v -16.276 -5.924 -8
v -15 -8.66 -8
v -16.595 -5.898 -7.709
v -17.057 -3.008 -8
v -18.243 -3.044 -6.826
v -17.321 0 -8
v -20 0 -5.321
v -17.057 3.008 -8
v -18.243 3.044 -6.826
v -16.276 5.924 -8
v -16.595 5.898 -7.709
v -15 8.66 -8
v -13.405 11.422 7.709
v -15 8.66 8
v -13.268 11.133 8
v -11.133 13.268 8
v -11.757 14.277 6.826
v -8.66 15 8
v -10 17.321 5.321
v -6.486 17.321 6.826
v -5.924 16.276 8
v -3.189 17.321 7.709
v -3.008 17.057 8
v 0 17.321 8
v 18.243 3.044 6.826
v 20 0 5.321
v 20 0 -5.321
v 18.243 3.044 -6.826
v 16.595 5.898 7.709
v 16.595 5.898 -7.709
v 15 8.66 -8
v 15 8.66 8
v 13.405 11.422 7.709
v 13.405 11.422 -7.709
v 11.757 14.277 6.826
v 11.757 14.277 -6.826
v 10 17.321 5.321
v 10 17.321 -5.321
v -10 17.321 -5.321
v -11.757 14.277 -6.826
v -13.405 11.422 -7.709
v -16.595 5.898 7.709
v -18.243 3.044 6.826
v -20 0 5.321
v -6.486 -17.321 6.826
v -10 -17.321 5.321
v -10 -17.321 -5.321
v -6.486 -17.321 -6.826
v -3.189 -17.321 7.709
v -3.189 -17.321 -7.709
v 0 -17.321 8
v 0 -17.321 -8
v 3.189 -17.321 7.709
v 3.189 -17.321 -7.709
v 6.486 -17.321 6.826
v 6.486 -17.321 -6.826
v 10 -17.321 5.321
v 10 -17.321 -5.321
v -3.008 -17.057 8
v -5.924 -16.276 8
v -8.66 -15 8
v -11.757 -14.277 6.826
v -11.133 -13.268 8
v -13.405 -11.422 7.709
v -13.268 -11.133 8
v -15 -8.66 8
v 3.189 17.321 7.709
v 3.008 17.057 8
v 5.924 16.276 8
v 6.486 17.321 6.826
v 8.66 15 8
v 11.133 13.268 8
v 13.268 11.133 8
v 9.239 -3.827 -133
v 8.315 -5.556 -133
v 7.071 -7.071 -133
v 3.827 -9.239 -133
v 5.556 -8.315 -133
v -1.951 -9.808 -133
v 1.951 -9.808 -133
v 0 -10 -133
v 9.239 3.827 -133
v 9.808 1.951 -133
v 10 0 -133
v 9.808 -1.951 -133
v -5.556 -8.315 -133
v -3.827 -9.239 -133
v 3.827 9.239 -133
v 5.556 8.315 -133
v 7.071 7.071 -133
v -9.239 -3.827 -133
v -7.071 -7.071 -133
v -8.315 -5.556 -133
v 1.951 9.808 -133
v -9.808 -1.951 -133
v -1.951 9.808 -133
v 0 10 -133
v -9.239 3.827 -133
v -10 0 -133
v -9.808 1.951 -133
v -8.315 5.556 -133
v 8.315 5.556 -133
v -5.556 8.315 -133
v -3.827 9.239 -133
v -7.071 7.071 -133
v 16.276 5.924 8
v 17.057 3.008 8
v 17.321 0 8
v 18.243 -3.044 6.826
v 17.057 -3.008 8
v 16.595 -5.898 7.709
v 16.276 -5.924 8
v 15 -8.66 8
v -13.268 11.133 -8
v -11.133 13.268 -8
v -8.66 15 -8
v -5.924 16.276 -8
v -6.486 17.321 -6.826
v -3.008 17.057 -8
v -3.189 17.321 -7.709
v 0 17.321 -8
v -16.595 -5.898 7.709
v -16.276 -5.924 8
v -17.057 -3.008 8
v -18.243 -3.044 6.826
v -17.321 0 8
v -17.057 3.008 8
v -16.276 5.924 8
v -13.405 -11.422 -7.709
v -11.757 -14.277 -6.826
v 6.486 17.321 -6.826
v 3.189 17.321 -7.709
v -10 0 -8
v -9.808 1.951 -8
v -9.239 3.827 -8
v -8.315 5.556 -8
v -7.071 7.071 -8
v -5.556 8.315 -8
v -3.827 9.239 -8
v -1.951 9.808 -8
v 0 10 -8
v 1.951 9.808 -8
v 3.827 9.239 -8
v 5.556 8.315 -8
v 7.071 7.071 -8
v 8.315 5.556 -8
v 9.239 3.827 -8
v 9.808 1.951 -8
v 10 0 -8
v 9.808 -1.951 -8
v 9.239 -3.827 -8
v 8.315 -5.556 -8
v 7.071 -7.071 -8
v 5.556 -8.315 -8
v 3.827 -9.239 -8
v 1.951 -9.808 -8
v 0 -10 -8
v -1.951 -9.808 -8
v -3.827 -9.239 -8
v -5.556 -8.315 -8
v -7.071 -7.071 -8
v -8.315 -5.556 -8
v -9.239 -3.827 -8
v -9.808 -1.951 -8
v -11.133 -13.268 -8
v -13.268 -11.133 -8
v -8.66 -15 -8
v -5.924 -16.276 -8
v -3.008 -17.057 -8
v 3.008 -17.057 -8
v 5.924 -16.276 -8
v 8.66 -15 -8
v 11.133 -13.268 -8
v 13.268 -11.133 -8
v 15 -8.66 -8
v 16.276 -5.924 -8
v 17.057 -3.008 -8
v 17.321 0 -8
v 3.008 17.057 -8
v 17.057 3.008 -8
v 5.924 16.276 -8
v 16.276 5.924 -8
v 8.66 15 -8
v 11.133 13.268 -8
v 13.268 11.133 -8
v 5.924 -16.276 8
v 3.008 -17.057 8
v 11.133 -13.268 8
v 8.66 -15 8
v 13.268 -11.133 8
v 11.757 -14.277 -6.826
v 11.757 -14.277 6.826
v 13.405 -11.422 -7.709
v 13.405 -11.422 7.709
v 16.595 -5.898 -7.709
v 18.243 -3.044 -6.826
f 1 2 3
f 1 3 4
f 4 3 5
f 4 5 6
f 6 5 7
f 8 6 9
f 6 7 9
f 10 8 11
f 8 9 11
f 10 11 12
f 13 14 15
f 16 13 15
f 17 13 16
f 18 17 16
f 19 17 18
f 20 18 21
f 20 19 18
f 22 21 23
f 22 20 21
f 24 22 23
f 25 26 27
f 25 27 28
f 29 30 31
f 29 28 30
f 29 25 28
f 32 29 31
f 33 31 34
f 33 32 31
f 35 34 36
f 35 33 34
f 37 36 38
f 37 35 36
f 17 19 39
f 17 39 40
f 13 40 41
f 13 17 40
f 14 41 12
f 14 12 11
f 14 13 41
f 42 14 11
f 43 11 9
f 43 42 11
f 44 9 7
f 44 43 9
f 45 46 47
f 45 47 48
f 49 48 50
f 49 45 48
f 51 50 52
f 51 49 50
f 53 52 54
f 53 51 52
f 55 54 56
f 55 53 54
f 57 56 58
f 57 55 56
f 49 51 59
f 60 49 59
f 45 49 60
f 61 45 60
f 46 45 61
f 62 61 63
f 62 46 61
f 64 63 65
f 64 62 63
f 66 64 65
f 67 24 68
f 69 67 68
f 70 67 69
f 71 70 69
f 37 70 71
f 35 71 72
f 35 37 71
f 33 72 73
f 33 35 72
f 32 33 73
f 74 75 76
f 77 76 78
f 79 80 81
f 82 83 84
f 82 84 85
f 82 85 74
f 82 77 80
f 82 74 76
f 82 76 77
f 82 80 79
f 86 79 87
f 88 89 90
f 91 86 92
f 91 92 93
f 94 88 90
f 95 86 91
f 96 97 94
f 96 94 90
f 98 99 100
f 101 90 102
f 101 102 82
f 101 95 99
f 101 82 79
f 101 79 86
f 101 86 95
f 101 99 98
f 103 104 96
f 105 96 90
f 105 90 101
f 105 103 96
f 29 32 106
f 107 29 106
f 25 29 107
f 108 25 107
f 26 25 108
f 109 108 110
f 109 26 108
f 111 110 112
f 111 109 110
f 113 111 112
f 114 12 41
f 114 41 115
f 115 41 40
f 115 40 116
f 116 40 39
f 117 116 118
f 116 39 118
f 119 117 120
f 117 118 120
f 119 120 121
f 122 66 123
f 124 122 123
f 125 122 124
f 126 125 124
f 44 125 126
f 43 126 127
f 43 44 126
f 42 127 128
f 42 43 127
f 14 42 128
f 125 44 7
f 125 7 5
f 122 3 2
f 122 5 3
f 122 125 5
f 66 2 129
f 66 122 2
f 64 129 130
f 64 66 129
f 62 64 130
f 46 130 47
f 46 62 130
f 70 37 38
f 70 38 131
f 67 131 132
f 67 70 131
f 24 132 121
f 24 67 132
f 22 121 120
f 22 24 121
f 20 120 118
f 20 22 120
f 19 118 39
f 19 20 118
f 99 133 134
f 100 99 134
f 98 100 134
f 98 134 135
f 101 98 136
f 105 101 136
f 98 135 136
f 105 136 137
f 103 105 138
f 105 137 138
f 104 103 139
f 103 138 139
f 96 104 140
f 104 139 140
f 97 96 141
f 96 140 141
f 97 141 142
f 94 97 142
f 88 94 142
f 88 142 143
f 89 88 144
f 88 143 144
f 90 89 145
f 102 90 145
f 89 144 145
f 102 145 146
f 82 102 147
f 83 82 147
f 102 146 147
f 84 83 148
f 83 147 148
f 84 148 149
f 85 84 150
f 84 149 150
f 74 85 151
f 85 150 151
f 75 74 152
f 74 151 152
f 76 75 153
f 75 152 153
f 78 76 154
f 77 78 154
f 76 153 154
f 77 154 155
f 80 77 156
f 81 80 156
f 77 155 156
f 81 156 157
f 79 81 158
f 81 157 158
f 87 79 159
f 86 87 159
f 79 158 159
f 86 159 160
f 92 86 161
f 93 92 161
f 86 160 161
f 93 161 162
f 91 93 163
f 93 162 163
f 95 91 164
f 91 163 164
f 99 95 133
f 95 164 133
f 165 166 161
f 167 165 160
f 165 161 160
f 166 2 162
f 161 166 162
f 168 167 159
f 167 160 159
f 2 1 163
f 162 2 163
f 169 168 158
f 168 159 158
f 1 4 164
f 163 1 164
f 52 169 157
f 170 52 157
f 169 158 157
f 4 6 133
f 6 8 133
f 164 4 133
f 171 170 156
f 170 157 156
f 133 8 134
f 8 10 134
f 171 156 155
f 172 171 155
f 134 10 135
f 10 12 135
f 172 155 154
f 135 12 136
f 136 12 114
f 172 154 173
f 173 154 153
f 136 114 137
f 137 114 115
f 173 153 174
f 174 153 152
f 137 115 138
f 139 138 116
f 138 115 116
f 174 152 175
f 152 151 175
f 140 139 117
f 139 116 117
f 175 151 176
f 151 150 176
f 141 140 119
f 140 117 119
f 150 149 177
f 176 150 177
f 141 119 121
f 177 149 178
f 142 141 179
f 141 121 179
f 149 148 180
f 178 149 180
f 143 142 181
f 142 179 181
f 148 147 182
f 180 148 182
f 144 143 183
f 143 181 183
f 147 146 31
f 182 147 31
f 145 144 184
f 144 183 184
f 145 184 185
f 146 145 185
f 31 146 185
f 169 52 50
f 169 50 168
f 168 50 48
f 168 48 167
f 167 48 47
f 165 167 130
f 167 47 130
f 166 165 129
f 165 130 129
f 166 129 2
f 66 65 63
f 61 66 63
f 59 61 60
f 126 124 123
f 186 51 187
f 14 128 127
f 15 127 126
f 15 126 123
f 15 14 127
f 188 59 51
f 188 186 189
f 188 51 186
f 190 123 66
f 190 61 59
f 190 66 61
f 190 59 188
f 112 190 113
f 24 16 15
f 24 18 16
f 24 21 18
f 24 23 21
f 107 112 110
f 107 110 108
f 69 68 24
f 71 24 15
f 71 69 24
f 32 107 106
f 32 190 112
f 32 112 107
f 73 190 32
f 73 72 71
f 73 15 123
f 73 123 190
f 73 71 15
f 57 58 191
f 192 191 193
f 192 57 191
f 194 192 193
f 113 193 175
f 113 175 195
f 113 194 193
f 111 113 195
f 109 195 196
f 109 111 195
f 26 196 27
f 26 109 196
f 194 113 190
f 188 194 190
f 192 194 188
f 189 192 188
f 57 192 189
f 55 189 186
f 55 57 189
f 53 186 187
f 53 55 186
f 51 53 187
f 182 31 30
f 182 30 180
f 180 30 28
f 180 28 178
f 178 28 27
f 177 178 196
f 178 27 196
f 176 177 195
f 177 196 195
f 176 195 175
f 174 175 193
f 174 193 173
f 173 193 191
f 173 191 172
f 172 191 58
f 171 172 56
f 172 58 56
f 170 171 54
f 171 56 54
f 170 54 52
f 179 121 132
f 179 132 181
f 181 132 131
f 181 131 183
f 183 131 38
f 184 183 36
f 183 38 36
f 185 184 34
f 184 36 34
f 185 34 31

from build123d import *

# Parameters (mm, degrees)
BOSS_EXTRUDE1_DEPTH = 8
SKETCH2_OUTSIDE_W   = 87.056
SKETCH2_OUTSIDE_H   = 81.698
SKETCH2_OUTSIDE_R   = 17.320508076
CUT_EXTRUDE1_DEPTH  = 17
CUT_EXTRUDE1_TAPER  = 45
SKETCH3_R           = 10
BOSS_EXTRUDE2_DEPTH = 125


with BuildPart() as part:
    # Sketch1 → Boss-Extrude1 (new body, symmetric)
    with BuildSketch(Plane.XY):
        Polygon((-10, 17.320508076), (-20, 0), (-10, -17.320508076), (10, -17.320508076), (20, 0), (10, 17.320508076), align=None)
    extrude(amount=BOSS_EXTRUDE1_DEPTH, both=True)

    # Sketch2 outside → Cut-Extrude1 (cut, through all)
    with BuildSketch(Plane.XY.offset(8)):
        Rectangle(SKETCH2_OUTSIDE_W, SKETCH2_OUTSIDE_H)
        Circle(SKETCH2_OUTSIDE_R, mode=Mode.SUBTRACT)
    cut_extrude1 = extrude(amount=-CUT_EXTRUDE1_DEPTH, taper=CUT_EXTRUDE1_TAPER, mode=Mode.SUBTRACT)

    # Mirror1: Cut-Extrude1 across plane
    add(cut_extrude1.mirror(Plane.XY), mode=Mode.SUBTRACT)

    # Sketch3 → Boss-Extrude2 (add)
    with BuildSketch(Plane(origin=(0, 0, -8), x_dir=(-1, 0, 0), z_dir=(0, 0, -1))):
        Circle(SKETCH3_R)
    extrude(amount=BOSS_EXTRUDE2_DEPTH)


solid = part.part
